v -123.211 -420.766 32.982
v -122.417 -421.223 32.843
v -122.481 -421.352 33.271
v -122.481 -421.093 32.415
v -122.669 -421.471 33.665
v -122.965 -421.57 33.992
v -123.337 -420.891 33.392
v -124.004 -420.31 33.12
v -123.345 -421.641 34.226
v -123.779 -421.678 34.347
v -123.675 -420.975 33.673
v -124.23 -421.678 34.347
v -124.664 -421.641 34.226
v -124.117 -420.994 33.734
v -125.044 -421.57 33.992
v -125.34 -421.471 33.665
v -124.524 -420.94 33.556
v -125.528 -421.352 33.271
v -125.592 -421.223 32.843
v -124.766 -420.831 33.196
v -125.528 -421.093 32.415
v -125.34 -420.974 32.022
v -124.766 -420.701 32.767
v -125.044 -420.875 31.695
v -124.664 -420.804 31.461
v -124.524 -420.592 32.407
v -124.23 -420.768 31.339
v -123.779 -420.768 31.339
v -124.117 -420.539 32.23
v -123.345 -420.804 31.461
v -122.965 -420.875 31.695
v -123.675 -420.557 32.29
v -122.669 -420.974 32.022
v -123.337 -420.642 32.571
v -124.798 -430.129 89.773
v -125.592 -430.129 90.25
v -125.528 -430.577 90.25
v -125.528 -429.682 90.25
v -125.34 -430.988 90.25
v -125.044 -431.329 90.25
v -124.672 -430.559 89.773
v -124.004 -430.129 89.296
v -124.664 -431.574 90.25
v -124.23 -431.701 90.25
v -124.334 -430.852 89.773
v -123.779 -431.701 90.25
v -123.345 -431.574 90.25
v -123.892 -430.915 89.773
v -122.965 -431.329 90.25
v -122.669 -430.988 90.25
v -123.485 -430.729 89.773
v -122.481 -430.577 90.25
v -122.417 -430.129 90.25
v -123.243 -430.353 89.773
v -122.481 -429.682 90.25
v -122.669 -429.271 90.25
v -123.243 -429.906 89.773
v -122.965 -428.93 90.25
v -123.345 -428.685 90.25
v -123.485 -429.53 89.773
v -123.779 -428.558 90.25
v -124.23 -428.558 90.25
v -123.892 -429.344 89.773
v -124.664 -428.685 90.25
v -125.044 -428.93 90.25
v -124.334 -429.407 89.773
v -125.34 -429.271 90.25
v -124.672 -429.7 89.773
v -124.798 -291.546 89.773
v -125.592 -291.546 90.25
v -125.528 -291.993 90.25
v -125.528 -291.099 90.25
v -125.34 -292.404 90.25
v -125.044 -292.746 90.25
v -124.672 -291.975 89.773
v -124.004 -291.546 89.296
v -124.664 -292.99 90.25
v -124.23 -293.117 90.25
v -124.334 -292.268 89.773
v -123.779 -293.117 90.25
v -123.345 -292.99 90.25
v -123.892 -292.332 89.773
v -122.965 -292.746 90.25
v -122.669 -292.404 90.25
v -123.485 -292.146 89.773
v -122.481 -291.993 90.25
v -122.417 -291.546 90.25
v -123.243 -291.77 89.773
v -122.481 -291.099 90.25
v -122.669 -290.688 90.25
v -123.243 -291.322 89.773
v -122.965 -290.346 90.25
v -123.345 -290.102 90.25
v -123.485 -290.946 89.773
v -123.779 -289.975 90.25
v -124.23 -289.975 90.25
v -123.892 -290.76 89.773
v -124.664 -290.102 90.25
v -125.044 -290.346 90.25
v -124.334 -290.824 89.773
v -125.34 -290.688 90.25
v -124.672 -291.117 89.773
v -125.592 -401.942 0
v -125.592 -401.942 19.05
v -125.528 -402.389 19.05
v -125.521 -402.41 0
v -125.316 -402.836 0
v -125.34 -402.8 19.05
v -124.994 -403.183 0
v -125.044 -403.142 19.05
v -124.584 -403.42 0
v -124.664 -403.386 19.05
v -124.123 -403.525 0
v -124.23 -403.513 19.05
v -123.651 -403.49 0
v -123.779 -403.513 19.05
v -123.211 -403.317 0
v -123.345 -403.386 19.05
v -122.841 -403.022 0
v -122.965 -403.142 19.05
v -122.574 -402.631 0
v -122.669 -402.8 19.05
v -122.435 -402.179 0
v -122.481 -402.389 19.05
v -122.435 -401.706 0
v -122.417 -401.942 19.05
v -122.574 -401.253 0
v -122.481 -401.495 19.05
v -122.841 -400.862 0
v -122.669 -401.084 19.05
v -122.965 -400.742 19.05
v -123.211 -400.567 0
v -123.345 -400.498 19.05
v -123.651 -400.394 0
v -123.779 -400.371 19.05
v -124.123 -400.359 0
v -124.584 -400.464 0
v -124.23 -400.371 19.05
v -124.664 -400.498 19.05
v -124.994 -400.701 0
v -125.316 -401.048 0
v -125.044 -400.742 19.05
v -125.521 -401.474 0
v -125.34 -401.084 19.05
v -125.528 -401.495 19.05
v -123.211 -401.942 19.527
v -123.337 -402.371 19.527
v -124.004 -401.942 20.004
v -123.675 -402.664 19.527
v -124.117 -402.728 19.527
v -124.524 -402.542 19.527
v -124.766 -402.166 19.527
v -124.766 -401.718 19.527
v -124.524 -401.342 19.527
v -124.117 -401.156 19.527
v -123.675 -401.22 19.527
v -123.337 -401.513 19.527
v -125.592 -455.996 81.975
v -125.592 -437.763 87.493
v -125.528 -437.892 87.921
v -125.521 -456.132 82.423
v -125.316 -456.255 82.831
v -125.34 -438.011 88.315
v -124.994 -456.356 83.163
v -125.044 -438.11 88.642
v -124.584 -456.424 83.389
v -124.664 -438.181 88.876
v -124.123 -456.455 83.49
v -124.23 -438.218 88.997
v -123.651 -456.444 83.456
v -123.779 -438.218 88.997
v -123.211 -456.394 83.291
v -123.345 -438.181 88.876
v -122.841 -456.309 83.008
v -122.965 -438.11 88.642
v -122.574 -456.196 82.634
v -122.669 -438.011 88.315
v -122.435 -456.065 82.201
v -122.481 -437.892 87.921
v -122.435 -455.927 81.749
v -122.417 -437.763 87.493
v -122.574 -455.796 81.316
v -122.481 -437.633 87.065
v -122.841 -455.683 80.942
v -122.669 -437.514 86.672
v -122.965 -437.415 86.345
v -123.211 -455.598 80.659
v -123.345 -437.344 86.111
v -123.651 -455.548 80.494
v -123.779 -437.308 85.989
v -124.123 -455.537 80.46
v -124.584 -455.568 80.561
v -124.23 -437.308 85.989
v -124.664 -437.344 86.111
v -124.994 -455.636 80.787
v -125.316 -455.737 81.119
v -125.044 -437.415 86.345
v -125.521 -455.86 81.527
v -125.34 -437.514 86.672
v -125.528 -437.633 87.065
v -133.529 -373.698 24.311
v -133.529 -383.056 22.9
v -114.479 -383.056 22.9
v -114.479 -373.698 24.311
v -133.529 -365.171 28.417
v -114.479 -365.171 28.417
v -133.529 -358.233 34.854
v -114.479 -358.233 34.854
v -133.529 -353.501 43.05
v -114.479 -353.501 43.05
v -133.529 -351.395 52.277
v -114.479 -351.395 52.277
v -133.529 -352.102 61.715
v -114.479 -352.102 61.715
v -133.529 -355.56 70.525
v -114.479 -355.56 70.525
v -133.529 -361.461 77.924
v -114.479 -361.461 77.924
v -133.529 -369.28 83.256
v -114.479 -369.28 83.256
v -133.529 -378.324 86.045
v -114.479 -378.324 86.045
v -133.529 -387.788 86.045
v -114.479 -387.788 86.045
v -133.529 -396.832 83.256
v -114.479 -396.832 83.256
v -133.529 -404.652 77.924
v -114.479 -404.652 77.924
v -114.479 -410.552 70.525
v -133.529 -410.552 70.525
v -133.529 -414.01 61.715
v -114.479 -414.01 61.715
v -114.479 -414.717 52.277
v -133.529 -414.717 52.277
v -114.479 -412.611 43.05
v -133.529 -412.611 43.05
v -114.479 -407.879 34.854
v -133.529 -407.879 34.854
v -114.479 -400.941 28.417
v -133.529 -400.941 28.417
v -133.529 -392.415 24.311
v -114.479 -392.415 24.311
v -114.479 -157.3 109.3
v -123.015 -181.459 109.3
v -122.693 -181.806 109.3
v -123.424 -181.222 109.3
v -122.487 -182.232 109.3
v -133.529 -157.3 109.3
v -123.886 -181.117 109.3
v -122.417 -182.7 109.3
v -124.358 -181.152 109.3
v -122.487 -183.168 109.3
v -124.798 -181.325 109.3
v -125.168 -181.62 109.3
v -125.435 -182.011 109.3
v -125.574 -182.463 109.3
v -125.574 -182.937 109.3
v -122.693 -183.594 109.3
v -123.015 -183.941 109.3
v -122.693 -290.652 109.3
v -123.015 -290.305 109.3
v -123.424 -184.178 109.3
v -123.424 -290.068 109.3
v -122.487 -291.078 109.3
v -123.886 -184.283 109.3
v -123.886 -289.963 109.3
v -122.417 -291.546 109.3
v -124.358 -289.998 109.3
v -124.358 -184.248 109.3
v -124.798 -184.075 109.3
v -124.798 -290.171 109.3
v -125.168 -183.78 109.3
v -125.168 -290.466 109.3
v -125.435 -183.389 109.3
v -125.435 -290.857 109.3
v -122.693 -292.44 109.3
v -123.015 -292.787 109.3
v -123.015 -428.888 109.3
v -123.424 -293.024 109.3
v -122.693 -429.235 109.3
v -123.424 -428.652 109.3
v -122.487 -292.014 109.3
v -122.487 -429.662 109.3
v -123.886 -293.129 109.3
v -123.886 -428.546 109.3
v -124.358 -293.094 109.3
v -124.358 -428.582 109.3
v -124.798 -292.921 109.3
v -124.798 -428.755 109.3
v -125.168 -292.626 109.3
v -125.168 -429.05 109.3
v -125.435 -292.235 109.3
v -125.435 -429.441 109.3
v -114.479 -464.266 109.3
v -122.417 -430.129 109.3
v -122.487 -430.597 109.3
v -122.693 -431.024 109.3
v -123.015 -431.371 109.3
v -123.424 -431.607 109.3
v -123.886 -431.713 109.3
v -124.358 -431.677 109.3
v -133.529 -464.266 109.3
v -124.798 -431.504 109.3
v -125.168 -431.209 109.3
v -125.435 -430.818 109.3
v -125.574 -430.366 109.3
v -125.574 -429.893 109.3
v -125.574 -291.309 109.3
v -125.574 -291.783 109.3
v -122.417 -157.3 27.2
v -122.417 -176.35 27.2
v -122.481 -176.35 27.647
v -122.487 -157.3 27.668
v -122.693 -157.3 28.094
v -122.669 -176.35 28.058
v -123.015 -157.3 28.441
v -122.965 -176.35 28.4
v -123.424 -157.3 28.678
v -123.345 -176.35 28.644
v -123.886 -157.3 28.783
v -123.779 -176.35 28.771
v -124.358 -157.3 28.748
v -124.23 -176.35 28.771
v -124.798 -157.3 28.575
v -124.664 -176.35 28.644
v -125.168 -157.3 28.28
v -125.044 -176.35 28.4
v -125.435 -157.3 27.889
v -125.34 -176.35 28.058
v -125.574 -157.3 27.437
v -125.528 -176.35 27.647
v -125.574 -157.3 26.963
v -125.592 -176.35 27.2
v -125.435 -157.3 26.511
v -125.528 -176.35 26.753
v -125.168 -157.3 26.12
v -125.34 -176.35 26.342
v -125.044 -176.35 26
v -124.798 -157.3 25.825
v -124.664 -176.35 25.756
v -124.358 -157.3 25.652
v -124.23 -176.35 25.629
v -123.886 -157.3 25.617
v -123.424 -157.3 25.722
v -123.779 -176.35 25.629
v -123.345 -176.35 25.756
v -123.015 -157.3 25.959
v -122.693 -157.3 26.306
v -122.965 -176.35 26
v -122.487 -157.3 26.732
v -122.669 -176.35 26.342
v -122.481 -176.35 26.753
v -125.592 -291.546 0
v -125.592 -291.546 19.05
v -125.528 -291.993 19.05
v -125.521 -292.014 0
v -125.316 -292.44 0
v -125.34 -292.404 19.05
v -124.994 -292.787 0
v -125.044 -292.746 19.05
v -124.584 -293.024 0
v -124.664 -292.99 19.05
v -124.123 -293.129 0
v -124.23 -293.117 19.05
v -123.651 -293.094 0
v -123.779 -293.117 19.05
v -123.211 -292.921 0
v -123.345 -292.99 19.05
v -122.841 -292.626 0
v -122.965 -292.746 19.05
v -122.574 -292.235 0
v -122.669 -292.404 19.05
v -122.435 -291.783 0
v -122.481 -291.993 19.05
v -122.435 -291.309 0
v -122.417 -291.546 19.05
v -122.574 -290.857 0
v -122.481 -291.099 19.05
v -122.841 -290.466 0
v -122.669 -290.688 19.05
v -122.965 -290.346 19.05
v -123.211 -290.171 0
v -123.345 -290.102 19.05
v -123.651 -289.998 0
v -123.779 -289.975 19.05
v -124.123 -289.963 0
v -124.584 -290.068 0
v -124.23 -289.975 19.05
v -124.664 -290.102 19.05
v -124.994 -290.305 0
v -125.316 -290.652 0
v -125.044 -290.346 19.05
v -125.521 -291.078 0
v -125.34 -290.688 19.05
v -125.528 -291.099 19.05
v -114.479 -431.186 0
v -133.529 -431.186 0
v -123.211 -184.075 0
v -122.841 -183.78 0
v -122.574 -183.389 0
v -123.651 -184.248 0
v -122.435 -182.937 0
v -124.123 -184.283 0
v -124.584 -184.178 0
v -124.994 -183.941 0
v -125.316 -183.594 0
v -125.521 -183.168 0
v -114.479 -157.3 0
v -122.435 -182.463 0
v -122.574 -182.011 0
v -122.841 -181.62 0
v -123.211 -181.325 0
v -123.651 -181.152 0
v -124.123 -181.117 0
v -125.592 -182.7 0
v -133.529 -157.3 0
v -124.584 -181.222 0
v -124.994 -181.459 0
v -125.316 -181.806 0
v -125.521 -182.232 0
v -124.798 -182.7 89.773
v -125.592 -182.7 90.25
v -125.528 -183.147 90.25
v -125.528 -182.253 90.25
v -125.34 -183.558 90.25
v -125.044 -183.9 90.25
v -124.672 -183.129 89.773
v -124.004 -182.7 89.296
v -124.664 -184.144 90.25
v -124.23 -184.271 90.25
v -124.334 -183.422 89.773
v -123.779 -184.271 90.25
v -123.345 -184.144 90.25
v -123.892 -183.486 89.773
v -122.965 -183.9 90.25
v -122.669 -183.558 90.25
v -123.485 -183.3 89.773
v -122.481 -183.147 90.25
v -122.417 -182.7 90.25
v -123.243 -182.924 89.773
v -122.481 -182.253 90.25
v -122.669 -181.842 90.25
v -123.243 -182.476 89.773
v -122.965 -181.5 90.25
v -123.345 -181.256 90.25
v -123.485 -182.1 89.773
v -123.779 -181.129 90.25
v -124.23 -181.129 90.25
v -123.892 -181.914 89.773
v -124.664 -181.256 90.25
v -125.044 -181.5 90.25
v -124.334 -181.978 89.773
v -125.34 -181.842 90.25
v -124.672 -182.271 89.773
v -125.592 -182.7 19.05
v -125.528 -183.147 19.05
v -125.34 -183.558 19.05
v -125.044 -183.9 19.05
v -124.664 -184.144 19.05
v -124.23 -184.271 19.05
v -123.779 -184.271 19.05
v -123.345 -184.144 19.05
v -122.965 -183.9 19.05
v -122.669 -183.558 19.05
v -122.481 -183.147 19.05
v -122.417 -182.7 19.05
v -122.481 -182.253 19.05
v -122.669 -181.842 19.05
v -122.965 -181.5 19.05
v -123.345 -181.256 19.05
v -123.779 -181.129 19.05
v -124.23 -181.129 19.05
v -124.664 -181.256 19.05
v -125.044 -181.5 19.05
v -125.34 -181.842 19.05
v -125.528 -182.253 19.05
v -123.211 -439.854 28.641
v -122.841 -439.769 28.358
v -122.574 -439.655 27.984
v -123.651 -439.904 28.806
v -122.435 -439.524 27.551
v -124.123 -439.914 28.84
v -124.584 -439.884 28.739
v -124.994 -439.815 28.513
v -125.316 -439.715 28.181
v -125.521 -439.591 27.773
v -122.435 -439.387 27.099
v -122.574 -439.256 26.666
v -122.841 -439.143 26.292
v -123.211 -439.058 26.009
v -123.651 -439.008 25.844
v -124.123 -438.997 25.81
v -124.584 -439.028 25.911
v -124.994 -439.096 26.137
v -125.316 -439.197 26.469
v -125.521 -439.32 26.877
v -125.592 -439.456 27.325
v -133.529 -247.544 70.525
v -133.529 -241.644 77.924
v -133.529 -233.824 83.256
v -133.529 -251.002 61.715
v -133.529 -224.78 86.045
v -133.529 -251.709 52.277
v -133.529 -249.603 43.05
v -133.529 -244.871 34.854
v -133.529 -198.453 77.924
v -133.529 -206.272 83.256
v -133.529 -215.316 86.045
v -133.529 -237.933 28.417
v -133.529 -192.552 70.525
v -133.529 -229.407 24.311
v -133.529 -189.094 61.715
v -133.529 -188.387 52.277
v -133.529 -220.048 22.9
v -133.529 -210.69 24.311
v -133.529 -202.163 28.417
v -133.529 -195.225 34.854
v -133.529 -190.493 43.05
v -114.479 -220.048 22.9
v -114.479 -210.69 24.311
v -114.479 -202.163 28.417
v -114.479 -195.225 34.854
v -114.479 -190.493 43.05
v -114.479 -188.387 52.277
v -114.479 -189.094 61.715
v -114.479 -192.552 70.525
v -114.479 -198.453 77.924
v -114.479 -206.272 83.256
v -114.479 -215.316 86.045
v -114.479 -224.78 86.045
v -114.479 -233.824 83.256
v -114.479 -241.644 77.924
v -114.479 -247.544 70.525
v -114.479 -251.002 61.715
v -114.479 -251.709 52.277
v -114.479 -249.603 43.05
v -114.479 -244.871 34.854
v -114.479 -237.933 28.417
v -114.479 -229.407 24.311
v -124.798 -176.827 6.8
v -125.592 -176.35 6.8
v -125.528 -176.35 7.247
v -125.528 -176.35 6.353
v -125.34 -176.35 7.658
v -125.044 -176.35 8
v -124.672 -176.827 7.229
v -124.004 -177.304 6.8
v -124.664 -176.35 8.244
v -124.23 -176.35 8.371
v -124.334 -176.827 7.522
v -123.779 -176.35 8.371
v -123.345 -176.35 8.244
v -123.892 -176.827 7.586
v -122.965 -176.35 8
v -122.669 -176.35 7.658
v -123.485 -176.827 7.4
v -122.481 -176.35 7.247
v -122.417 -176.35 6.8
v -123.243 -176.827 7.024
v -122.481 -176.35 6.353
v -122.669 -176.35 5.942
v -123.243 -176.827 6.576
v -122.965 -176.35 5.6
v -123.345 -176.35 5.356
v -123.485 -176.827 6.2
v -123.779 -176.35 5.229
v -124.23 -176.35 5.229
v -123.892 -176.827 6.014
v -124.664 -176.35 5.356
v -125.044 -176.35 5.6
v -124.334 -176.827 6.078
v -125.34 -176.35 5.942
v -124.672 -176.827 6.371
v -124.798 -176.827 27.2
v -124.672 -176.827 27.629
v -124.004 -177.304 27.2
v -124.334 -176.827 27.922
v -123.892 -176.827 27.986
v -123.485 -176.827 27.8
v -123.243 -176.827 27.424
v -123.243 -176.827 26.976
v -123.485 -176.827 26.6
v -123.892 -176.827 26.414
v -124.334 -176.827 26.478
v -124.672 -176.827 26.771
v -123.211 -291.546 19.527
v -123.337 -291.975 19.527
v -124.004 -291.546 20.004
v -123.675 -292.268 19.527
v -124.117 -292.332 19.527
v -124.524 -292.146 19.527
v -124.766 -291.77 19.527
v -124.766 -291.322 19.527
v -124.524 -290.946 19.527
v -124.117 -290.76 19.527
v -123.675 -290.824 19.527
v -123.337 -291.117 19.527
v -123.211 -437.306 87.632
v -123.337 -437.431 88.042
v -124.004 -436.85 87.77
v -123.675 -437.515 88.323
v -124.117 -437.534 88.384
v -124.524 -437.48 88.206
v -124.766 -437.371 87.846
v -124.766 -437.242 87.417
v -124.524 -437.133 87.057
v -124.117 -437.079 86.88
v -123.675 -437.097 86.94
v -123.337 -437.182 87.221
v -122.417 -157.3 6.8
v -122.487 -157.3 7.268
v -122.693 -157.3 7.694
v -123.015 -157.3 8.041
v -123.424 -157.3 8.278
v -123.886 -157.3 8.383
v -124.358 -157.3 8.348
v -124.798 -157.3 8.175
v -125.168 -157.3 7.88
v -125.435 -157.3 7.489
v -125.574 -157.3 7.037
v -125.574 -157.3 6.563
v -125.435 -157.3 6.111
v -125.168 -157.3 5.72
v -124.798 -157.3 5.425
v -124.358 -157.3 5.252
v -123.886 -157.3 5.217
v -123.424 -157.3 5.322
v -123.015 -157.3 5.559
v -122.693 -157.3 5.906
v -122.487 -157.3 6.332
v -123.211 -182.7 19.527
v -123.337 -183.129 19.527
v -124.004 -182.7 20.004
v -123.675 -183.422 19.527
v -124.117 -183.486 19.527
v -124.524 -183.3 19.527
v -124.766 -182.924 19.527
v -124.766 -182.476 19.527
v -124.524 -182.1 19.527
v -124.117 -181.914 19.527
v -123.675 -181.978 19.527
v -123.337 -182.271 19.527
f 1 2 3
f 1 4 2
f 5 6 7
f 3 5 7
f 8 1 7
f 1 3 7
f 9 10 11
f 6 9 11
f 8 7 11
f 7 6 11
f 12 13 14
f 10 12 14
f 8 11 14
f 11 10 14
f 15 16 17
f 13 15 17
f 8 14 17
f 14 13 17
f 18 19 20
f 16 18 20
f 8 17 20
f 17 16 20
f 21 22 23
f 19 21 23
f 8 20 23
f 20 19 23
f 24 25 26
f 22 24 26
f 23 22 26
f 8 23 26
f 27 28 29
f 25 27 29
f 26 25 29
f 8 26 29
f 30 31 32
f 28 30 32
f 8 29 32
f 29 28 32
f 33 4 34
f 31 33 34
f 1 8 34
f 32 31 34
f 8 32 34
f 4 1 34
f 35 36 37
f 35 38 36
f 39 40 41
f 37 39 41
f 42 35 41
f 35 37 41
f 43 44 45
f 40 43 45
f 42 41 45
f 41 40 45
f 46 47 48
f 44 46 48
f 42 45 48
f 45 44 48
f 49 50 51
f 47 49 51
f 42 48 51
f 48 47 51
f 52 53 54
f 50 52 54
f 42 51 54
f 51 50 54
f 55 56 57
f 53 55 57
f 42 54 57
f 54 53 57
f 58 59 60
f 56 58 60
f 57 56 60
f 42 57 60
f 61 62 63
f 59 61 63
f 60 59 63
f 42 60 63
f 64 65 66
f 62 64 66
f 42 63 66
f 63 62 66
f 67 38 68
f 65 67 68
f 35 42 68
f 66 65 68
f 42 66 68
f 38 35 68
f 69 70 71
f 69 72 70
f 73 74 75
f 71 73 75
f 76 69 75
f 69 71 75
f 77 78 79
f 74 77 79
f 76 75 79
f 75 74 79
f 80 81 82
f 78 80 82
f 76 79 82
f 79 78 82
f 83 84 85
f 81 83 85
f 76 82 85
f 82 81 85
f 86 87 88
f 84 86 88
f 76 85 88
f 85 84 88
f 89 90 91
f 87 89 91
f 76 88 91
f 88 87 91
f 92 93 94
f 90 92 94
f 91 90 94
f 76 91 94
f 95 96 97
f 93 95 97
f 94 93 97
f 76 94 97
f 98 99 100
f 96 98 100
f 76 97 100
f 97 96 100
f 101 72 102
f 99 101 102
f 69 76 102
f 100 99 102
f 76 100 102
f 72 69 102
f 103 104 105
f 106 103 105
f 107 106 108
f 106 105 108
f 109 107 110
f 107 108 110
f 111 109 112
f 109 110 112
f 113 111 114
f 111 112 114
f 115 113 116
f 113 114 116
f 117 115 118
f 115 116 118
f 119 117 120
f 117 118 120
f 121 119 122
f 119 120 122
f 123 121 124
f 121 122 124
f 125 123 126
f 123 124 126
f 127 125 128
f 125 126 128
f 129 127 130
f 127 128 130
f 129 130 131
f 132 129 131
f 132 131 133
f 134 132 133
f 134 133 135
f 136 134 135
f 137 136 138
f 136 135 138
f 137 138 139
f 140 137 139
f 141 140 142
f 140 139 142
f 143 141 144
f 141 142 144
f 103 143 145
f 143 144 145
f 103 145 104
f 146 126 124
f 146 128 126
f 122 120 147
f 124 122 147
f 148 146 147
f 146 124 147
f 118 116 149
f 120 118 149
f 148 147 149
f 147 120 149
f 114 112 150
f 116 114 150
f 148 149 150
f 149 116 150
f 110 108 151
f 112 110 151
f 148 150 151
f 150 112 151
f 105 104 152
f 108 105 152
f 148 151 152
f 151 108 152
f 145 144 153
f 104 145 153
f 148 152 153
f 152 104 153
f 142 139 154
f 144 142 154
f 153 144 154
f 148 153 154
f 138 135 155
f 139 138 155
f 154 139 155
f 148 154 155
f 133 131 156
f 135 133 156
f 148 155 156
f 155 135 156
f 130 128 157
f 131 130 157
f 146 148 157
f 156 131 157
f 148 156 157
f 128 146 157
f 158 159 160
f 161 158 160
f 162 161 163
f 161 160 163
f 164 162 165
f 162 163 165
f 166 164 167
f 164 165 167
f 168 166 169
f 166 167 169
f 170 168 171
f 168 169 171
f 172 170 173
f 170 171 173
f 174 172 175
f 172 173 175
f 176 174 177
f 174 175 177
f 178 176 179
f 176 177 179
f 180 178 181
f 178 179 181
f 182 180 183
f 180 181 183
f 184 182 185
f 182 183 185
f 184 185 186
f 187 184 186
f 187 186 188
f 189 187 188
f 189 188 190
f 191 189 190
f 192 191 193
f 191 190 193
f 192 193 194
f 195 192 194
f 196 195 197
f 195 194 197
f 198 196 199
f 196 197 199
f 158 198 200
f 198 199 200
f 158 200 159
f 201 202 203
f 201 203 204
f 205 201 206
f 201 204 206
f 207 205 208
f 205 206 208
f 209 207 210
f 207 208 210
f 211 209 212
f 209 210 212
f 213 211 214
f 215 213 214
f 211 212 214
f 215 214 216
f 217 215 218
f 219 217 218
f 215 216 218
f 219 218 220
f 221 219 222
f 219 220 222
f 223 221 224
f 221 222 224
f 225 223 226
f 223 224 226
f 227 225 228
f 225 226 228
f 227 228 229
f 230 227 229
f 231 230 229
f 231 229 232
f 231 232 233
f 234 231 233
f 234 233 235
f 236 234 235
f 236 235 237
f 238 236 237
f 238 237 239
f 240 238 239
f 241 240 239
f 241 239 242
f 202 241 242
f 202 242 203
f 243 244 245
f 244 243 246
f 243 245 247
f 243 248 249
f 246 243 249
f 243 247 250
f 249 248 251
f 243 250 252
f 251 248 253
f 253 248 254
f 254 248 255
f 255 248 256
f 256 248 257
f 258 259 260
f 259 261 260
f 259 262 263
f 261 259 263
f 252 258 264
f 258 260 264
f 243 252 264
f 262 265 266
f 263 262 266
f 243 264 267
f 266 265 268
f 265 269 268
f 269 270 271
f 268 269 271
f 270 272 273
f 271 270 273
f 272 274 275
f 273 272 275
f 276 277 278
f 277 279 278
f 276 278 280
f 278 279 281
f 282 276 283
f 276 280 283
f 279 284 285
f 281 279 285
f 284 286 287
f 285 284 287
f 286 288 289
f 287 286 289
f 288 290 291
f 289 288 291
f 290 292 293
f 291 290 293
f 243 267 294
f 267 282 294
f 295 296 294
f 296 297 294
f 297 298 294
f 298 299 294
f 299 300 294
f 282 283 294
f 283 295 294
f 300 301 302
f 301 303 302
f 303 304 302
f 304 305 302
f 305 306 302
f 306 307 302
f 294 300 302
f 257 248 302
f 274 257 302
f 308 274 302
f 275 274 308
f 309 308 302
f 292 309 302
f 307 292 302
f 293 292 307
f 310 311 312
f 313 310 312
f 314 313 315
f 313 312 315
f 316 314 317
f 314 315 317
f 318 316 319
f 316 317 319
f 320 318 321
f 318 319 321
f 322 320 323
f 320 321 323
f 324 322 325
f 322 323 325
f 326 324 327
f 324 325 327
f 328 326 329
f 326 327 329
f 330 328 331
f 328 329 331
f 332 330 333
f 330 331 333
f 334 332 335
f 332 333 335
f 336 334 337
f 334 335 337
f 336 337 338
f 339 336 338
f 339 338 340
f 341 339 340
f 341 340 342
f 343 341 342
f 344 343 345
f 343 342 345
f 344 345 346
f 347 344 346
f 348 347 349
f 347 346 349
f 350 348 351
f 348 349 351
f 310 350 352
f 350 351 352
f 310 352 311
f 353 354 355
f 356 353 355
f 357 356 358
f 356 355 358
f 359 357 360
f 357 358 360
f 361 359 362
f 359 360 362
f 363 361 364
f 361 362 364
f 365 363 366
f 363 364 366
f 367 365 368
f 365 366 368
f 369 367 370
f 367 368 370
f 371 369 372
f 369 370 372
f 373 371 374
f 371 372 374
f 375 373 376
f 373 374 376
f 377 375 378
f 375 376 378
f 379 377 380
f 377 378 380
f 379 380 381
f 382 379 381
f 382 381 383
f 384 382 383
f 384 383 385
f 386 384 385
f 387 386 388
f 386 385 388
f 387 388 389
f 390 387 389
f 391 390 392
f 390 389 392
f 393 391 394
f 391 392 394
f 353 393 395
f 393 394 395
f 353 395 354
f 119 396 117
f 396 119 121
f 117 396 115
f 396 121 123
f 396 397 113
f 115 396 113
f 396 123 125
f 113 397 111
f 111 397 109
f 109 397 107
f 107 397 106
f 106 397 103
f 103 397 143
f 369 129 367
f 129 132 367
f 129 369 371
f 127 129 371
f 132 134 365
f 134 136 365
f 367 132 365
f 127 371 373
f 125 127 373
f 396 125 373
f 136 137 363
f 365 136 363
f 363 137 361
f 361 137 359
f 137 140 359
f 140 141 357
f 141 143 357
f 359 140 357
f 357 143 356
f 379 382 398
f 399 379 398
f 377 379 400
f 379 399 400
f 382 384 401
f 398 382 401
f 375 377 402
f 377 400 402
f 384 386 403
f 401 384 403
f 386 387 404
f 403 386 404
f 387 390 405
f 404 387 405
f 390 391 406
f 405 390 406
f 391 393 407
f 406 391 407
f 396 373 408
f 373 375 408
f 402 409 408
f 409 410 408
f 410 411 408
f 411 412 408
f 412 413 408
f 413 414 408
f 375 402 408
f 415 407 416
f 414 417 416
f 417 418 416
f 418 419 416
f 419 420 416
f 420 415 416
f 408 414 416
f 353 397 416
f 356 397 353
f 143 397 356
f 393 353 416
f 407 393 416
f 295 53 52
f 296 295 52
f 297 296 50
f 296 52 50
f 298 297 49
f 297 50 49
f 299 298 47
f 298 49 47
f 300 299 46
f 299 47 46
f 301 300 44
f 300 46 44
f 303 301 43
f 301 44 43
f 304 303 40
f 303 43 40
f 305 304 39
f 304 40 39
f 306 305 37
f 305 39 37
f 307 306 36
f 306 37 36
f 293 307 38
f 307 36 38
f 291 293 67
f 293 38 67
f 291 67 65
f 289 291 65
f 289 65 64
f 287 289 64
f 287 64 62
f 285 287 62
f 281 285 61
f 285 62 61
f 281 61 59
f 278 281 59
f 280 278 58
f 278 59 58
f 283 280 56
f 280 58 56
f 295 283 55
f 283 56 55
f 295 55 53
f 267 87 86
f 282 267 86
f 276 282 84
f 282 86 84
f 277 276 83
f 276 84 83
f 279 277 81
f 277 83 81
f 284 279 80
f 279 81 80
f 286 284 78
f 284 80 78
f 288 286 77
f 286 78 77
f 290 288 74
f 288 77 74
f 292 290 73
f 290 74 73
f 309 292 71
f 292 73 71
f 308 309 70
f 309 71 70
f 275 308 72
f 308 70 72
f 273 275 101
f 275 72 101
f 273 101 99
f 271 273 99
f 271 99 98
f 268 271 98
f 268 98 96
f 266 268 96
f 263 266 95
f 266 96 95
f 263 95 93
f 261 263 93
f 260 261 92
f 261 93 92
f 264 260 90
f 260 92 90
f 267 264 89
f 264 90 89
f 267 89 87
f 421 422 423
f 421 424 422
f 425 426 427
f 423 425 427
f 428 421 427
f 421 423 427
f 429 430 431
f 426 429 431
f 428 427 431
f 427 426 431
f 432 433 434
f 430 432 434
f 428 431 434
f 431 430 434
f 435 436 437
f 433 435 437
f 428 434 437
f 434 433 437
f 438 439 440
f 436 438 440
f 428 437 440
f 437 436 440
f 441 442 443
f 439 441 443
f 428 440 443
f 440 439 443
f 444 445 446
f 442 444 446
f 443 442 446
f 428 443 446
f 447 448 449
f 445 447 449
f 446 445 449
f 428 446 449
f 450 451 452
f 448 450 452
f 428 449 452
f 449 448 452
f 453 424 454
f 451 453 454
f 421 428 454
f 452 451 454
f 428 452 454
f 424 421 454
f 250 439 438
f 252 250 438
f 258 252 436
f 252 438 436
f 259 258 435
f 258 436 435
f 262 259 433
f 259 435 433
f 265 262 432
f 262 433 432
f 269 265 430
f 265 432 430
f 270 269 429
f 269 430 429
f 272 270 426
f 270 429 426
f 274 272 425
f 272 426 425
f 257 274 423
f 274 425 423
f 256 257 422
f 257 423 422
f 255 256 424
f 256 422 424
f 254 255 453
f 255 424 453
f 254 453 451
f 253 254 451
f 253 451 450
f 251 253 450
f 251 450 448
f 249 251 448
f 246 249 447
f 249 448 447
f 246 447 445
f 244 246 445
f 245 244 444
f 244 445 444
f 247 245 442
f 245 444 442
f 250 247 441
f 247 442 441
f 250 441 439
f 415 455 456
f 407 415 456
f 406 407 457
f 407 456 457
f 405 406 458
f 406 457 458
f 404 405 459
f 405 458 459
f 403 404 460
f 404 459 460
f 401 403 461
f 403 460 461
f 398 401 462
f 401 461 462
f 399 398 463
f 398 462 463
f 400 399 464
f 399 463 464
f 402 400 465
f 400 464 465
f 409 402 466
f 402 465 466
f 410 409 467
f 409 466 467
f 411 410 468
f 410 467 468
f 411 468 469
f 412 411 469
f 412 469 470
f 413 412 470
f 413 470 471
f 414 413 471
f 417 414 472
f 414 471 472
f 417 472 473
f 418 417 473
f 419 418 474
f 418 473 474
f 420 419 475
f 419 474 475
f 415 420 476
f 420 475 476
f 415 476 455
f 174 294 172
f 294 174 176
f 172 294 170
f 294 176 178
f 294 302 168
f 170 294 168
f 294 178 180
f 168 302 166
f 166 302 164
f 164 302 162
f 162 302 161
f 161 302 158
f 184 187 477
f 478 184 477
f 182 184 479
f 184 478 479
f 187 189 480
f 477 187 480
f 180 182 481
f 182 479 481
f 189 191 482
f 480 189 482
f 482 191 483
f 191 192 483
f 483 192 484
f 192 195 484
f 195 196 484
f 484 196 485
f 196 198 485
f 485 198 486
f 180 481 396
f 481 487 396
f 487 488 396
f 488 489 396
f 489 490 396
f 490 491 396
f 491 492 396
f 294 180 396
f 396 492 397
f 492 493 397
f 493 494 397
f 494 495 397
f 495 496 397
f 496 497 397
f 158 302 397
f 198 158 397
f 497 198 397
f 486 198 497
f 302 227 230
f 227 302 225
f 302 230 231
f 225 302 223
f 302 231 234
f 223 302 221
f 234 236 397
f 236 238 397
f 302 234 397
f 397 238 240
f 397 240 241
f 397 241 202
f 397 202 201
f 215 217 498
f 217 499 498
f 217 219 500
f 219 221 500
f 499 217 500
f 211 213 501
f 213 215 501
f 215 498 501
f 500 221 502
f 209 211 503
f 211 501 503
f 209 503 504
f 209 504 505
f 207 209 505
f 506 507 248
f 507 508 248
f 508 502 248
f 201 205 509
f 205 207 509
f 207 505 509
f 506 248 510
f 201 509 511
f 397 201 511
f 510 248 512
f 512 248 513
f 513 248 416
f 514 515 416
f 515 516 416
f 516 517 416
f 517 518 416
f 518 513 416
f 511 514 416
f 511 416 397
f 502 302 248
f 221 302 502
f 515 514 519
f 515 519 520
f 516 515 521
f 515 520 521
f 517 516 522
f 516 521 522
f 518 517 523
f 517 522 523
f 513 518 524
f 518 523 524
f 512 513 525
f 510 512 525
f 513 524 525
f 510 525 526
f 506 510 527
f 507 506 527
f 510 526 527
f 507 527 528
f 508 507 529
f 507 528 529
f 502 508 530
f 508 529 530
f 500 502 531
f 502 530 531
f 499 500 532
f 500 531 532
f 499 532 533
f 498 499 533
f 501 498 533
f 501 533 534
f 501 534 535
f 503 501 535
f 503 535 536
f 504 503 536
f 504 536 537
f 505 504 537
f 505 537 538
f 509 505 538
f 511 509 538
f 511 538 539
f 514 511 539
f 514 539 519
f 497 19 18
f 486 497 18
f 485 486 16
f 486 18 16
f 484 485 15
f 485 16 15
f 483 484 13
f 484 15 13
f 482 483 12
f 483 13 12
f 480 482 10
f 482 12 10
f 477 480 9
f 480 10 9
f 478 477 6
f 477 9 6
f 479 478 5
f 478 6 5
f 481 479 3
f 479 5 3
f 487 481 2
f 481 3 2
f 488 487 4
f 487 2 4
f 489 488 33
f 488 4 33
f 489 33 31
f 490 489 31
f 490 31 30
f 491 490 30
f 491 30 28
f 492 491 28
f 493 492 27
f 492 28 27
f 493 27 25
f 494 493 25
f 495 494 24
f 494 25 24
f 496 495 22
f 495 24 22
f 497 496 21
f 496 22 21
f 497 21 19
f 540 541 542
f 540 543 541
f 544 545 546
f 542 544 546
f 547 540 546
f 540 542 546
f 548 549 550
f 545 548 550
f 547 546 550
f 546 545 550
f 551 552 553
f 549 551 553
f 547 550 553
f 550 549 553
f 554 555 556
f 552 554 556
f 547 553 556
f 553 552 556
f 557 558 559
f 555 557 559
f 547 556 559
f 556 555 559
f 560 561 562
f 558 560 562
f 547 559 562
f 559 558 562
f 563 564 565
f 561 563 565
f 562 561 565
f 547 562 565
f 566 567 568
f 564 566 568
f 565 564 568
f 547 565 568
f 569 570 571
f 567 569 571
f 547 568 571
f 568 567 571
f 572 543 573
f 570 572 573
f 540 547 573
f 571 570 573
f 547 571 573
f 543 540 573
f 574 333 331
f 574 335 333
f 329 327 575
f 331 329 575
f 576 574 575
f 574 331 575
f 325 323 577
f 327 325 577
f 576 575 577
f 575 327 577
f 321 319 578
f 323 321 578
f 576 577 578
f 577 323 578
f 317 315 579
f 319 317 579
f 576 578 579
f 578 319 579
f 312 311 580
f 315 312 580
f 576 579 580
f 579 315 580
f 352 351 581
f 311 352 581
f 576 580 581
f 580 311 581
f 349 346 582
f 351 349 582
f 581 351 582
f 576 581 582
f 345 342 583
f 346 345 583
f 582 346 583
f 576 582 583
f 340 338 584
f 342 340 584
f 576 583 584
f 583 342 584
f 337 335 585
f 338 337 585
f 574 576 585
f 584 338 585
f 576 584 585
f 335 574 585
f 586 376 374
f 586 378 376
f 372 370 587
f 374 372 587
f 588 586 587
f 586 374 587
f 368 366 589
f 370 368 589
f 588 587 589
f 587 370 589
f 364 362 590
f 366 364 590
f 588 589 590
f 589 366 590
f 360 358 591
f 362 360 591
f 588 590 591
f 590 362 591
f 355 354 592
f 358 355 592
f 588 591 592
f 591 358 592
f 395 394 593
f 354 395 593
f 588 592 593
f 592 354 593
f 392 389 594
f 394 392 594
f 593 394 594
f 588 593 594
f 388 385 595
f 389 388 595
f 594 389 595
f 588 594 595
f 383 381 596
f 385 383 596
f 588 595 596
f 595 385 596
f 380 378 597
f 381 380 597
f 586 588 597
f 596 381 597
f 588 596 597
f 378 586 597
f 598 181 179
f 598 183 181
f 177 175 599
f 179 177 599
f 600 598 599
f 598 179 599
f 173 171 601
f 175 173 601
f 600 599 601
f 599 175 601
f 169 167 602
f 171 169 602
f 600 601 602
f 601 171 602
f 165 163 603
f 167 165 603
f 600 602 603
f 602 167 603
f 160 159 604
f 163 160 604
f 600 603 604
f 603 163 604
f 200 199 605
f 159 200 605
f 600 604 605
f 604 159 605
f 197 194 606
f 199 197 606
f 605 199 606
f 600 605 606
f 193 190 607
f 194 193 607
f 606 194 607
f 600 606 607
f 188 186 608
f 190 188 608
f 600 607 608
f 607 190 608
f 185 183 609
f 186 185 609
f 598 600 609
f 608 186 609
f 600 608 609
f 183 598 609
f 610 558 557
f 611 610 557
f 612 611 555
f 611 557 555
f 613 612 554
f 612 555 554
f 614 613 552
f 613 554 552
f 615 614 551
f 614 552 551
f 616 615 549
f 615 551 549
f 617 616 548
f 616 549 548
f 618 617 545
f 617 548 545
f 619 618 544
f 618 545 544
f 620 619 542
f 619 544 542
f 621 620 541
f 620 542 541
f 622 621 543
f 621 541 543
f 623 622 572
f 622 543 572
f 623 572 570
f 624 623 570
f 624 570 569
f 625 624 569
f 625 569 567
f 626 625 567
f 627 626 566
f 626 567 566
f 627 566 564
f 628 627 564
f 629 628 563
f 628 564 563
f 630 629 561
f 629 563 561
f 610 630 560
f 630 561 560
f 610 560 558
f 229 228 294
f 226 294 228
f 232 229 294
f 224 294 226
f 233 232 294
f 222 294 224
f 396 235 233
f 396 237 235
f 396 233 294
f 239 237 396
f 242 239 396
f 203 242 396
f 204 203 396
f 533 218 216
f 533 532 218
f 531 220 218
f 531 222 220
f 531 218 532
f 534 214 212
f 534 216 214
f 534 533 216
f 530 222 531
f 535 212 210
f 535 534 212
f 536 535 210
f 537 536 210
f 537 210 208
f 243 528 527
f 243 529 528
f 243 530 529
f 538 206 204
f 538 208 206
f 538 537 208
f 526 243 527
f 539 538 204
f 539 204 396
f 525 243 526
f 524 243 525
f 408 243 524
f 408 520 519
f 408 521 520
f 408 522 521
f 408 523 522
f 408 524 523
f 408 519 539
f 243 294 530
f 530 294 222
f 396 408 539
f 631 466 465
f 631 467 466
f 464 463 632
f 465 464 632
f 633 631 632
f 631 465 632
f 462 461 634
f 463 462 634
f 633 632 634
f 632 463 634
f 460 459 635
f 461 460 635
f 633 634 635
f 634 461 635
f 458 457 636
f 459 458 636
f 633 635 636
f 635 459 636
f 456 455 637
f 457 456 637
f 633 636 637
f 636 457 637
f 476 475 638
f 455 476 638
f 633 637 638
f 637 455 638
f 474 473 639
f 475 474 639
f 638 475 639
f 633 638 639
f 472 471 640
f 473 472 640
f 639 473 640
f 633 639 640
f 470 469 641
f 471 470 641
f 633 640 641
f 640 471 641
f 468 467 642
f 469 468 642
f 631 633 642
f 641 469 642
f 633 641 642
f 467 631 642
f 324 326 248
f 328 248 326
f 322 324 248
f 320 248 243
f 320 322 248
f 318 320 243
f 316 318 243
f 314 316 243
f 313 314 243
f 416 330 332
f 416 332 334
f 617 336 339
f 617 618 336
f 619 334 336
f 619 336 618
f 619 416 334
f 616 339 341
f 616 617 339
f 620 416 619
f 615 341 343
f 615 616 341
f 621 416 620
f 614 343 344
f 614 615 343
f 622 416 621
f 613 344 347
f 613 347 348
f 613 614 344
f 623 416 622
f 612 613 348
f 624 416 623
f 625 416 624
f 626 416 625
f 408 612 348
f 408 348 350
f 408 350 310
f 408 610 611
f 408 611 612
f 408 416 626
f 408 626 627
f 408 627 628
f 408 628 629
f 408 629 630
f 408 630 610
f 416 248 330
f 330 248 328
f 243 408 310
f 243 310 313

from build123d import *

# Parameters (mm, degrees)
SKETCH1_W           = 19.05
SKETCH1_H           = 270.042121692
BOSS_EXTRUDE1_DEPTH = 33.95
SKETCH2_W           = 19.05
SKETCH2_H           = 270.042121692
BOSS_EXTRUDE2_DEPTH = 75.35
BOSS_EXTRUDE3_DEPTH = 19.05
HOLE1_D             = 3.175
HOLE1_DEPTH         = 31.75
HOLE1_CSINK_D       = 10.16
HOLE1_CSINK_ANGLE   = 82
HOLE1_TIP           = 0.953866233
HOLE3_D             = 3.175
HOLE3_DEPTH         = 31.75
HOLE3_CSINK_D       = 10.16
HOLE3_CSINK_ANGLE   = 82
HOLE3_TIP           = 0.953866233
HOLE4_D             = 3.175
HOLE4_DEPTH         = 31.75
HOLE4_CSINK_D       = 10.16
HOLE4_CSINK_ANGLE   = 82
HOLE4_TIP           = 0.953866233
HOLE5_D             = 3.175
HOLE5_DEPTH         = 31.75
HOLE5_CSINK_D       = 10.16
HOLE5_CSINK_ANGLE   = 82
HOLE5_TIP           = 0.953866233
HOLE6_D             = 63.5
HOLE6_DEPTH         = 19.05


with BuildPart() as part:
    # Sketch1 → Boss-Extrude1 (new body)
    with BuildSketch(Plane.XY):
        with Locations((-124.004465969, -292.321060846)):
            Rectangle(SKETCH1_W, SKETCH1_H)
    extrude(amount=BOSS_EXTRUDE1_DEPTH)

    # Sketch2 → Boss-Extrude2 (add)
    with BuildSketch(Plane.XY.offset(33.95)):
        with Locations((-124.004465969, -292.321060846)):
            Rectangle(SKETCH2_W, SKETCH2_H)
    extrude(amount=BOSS_EXTRUDE2_DEPTH)

    # Sketch3 → Boss-Extrude3 (add, through all)
    with BuildSketch(Plane.ZY.offset(133.529465969)):
        Polygon((109.3, -427.342121692), (109.3, -464.26606302), (0, -431.185843453), (0, -427.342121692), align=None)
    extrude(amount=-BOSS_EXTRUDE3_DEPTH)

    # Hole1
    with Locations(Plane(origin=(-124.004465969, 10.424290059, 122), x_dir=(-1, 0, 0), z_dir=(0, 0, 1))):
        with Locations((113.649999994, 128.807623392), (113.649999994, 23.940956725), (-94.599999994, 161.374290059), (94.599999994, 161.374290059), (0, 161.374290059), (0, 193.124290059), (0, 440.553783621), (0, 301.970350905), (40.979166666, 301.970350905), (166.795833328, 301.970350905), (207.774999994, 440.553783621), (207.774999994, 333.02141023), (207.774999994, 225.48903684), (207.774999994, 137.424290059), (207.774999994, 10.424290059), (-207.774999994, 10.424290059), (-207.774999994, 137.424290059), (-207.774999994, 225.48903684), (-207.774999994, 333.02141023), (-207.774999994, 440.553783621), (-166.795833328, 301.970350905), (-40.979166666, 301.970350905), (-113.649999994, 23.940956725), (-113.649999994, 128.807623392)):
            CounterSinkHole(HOLE1_D / 2, HOLE1_CSINK_D / 2, depth=HOLE1_DEPTH, counter_sink_angle=HOLE1_CSINK_ANGLE)
            with Locations((0, 0, -(HOLE1_DEPTH + HOLE1_TIP / 2))):  # 118° drill point
                Cone(0, HOLE1_D / 2, HOLE1_TIP, mode=Mode.SUBTRACT)

    # Hole3
    with Locations(Plane(origin=(-124.004465969, -144.6, -155.286738577), x_dir=(-1, 0, 0), z_dir=(0, 1, 0))):
        with Locations((0, 162.086738577), (0, 182.486738577)):
            CounterSinkHole(HOLE3_D / 2, HOLE3_CSINK_D / 2, depth=HOLE3_DEPTH, counter_sink_angle=HOLE3_CSINK_ANGLE)
            with Locations((0, 0, -(HOLE3_DEPTH + HOLE3_TIP / 2))):  # 118° drill point
                Cone(0, HOLE3_D / 2, HOLE3_TIP, mode=Mode.SUBTRACT)

    # Hole4
    with Locations(Plane(origin=(-124.004465969, 10.424290059, -12.7), x_dir=(1, 0, 0), z_dir=(0, 0, -1))):
        with Locations((-207.774999994, 333.02141023), (-207.774999994, 225.48903684), (-207.774999994, 137.424290059), (-172.166666661, 4.074290059), (-146.083333327, 4.074290059), (-94.599999994, 161.374290059), (0, 161.374290059), (94.599999994, 161.374290059), (146.083333327, 4.074290059), (172.166666661, 4.074290059), (207.774999994, 137.424290059), (207.774999994, 225.48903684), (207.774999994, 333.02141023), (166.795833328, 301.970350905), (40.979166666, 301.970350905), (-40.979166666, 301.970350905), (-166.795833328, 301.970350905), (0, 193.124290059), (0, 301.970350905), (0, 412.366411751), (-126.349999994, 106.824290059), (-126.349999994, 58.624290059), (126.349999994, 58.624290059), (126.349999994, 106.824290059)):
            CounterSinkHole(HOLE4_D / 2, HOLE4_CSINK_D / 2, depth=HOLE4_DEPTH, counter_sink_angle=HOLE4_CSINK_ANGLE)
            with Locations((0, 0, -(HOLE4_DEPTH + HOLE4_TIP / 2))):  # 118° drill point
                Cone(0, HOLE4_D / 2, HOLE4_TIP, mode=Mode.SUBTRACT)

    # Hole5
    with Locations(Plane(origin=(-124.004465969, -363.229637966, -268.375064111), x_dir=(1, 0, 0), z_dir=(0, -0.957123977, -0.289678603))):
        with Locations((207.774999994, 613.051808534), (-207.774999994, 613.051808534), (-207.774999994, 456.277103296), (-207.774999994, 769.826513772), (-108.649999997, 456.277103296), (-108.649999997, 630.126513772), (-108.649999997, 769.826513772), (-207.774999994, 362.200879148), (-207.774999994, 305.10273792), (0, 305.10273792), (0, 362.200879148), (207.774999994, 305.10273792), (207.774999994, 362.200879148), (108.649999997, 769.826513772), (108.649999997, 630.126513772), (108.649999997, 456.277103296), (207.774999994, 769.826513772), (207.774999994, 456.277103296)):
            CounterSinkHole(HOLE5_D / 2, HOLE5_CSINK_D / 2, depth=HOLE5_DEPTH, counter_sink_angle=HOLE5_CSINK_ANGLE)
            with Locations((0, 0, -(HOLE5_DEPTH + HOLE5_TIP / 2))):  # 118° drill point
                Cone(0, HOLE5_D / 2, HOLE5_TIP, mode=Mode.SUBTRACT)

    # Hole6
    with Locations(Plane.ZY.offset(133.529465969)):
        with Locations((54.65, -220.048030423), (54.65, -383.056061933)):
            Hole(HOLE6_D / 2, depth=HOLE6_DEPTH)


solid = part.part
